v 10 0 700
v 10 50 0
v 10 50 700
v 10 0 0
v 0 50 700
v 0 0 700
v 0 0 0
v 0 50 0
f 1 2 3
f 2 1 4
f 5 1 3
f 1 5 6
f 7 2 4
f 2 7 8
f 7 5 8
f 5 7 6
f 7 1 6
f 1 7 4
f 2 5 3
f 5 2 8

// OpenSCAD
difference()
{
  cube([10, 350, 700]);
  translate([0, 50, 0]) cube([10, 350, 700]);
  translate([0, 100, 0]) cube([10, 350, 700]);
  translate([0, 150, 0]) cube([10, 350, 700]);
  translate([0, 200, 0]) cube([10, 350, 700]);
  translate([0, 250, 0]) cube([10, 350, 700]);
  translate([0, 300, 0]) cube([10, 350, 700]);
  translate([0, 350, 0]) cube([10, 350, 700]);
}
